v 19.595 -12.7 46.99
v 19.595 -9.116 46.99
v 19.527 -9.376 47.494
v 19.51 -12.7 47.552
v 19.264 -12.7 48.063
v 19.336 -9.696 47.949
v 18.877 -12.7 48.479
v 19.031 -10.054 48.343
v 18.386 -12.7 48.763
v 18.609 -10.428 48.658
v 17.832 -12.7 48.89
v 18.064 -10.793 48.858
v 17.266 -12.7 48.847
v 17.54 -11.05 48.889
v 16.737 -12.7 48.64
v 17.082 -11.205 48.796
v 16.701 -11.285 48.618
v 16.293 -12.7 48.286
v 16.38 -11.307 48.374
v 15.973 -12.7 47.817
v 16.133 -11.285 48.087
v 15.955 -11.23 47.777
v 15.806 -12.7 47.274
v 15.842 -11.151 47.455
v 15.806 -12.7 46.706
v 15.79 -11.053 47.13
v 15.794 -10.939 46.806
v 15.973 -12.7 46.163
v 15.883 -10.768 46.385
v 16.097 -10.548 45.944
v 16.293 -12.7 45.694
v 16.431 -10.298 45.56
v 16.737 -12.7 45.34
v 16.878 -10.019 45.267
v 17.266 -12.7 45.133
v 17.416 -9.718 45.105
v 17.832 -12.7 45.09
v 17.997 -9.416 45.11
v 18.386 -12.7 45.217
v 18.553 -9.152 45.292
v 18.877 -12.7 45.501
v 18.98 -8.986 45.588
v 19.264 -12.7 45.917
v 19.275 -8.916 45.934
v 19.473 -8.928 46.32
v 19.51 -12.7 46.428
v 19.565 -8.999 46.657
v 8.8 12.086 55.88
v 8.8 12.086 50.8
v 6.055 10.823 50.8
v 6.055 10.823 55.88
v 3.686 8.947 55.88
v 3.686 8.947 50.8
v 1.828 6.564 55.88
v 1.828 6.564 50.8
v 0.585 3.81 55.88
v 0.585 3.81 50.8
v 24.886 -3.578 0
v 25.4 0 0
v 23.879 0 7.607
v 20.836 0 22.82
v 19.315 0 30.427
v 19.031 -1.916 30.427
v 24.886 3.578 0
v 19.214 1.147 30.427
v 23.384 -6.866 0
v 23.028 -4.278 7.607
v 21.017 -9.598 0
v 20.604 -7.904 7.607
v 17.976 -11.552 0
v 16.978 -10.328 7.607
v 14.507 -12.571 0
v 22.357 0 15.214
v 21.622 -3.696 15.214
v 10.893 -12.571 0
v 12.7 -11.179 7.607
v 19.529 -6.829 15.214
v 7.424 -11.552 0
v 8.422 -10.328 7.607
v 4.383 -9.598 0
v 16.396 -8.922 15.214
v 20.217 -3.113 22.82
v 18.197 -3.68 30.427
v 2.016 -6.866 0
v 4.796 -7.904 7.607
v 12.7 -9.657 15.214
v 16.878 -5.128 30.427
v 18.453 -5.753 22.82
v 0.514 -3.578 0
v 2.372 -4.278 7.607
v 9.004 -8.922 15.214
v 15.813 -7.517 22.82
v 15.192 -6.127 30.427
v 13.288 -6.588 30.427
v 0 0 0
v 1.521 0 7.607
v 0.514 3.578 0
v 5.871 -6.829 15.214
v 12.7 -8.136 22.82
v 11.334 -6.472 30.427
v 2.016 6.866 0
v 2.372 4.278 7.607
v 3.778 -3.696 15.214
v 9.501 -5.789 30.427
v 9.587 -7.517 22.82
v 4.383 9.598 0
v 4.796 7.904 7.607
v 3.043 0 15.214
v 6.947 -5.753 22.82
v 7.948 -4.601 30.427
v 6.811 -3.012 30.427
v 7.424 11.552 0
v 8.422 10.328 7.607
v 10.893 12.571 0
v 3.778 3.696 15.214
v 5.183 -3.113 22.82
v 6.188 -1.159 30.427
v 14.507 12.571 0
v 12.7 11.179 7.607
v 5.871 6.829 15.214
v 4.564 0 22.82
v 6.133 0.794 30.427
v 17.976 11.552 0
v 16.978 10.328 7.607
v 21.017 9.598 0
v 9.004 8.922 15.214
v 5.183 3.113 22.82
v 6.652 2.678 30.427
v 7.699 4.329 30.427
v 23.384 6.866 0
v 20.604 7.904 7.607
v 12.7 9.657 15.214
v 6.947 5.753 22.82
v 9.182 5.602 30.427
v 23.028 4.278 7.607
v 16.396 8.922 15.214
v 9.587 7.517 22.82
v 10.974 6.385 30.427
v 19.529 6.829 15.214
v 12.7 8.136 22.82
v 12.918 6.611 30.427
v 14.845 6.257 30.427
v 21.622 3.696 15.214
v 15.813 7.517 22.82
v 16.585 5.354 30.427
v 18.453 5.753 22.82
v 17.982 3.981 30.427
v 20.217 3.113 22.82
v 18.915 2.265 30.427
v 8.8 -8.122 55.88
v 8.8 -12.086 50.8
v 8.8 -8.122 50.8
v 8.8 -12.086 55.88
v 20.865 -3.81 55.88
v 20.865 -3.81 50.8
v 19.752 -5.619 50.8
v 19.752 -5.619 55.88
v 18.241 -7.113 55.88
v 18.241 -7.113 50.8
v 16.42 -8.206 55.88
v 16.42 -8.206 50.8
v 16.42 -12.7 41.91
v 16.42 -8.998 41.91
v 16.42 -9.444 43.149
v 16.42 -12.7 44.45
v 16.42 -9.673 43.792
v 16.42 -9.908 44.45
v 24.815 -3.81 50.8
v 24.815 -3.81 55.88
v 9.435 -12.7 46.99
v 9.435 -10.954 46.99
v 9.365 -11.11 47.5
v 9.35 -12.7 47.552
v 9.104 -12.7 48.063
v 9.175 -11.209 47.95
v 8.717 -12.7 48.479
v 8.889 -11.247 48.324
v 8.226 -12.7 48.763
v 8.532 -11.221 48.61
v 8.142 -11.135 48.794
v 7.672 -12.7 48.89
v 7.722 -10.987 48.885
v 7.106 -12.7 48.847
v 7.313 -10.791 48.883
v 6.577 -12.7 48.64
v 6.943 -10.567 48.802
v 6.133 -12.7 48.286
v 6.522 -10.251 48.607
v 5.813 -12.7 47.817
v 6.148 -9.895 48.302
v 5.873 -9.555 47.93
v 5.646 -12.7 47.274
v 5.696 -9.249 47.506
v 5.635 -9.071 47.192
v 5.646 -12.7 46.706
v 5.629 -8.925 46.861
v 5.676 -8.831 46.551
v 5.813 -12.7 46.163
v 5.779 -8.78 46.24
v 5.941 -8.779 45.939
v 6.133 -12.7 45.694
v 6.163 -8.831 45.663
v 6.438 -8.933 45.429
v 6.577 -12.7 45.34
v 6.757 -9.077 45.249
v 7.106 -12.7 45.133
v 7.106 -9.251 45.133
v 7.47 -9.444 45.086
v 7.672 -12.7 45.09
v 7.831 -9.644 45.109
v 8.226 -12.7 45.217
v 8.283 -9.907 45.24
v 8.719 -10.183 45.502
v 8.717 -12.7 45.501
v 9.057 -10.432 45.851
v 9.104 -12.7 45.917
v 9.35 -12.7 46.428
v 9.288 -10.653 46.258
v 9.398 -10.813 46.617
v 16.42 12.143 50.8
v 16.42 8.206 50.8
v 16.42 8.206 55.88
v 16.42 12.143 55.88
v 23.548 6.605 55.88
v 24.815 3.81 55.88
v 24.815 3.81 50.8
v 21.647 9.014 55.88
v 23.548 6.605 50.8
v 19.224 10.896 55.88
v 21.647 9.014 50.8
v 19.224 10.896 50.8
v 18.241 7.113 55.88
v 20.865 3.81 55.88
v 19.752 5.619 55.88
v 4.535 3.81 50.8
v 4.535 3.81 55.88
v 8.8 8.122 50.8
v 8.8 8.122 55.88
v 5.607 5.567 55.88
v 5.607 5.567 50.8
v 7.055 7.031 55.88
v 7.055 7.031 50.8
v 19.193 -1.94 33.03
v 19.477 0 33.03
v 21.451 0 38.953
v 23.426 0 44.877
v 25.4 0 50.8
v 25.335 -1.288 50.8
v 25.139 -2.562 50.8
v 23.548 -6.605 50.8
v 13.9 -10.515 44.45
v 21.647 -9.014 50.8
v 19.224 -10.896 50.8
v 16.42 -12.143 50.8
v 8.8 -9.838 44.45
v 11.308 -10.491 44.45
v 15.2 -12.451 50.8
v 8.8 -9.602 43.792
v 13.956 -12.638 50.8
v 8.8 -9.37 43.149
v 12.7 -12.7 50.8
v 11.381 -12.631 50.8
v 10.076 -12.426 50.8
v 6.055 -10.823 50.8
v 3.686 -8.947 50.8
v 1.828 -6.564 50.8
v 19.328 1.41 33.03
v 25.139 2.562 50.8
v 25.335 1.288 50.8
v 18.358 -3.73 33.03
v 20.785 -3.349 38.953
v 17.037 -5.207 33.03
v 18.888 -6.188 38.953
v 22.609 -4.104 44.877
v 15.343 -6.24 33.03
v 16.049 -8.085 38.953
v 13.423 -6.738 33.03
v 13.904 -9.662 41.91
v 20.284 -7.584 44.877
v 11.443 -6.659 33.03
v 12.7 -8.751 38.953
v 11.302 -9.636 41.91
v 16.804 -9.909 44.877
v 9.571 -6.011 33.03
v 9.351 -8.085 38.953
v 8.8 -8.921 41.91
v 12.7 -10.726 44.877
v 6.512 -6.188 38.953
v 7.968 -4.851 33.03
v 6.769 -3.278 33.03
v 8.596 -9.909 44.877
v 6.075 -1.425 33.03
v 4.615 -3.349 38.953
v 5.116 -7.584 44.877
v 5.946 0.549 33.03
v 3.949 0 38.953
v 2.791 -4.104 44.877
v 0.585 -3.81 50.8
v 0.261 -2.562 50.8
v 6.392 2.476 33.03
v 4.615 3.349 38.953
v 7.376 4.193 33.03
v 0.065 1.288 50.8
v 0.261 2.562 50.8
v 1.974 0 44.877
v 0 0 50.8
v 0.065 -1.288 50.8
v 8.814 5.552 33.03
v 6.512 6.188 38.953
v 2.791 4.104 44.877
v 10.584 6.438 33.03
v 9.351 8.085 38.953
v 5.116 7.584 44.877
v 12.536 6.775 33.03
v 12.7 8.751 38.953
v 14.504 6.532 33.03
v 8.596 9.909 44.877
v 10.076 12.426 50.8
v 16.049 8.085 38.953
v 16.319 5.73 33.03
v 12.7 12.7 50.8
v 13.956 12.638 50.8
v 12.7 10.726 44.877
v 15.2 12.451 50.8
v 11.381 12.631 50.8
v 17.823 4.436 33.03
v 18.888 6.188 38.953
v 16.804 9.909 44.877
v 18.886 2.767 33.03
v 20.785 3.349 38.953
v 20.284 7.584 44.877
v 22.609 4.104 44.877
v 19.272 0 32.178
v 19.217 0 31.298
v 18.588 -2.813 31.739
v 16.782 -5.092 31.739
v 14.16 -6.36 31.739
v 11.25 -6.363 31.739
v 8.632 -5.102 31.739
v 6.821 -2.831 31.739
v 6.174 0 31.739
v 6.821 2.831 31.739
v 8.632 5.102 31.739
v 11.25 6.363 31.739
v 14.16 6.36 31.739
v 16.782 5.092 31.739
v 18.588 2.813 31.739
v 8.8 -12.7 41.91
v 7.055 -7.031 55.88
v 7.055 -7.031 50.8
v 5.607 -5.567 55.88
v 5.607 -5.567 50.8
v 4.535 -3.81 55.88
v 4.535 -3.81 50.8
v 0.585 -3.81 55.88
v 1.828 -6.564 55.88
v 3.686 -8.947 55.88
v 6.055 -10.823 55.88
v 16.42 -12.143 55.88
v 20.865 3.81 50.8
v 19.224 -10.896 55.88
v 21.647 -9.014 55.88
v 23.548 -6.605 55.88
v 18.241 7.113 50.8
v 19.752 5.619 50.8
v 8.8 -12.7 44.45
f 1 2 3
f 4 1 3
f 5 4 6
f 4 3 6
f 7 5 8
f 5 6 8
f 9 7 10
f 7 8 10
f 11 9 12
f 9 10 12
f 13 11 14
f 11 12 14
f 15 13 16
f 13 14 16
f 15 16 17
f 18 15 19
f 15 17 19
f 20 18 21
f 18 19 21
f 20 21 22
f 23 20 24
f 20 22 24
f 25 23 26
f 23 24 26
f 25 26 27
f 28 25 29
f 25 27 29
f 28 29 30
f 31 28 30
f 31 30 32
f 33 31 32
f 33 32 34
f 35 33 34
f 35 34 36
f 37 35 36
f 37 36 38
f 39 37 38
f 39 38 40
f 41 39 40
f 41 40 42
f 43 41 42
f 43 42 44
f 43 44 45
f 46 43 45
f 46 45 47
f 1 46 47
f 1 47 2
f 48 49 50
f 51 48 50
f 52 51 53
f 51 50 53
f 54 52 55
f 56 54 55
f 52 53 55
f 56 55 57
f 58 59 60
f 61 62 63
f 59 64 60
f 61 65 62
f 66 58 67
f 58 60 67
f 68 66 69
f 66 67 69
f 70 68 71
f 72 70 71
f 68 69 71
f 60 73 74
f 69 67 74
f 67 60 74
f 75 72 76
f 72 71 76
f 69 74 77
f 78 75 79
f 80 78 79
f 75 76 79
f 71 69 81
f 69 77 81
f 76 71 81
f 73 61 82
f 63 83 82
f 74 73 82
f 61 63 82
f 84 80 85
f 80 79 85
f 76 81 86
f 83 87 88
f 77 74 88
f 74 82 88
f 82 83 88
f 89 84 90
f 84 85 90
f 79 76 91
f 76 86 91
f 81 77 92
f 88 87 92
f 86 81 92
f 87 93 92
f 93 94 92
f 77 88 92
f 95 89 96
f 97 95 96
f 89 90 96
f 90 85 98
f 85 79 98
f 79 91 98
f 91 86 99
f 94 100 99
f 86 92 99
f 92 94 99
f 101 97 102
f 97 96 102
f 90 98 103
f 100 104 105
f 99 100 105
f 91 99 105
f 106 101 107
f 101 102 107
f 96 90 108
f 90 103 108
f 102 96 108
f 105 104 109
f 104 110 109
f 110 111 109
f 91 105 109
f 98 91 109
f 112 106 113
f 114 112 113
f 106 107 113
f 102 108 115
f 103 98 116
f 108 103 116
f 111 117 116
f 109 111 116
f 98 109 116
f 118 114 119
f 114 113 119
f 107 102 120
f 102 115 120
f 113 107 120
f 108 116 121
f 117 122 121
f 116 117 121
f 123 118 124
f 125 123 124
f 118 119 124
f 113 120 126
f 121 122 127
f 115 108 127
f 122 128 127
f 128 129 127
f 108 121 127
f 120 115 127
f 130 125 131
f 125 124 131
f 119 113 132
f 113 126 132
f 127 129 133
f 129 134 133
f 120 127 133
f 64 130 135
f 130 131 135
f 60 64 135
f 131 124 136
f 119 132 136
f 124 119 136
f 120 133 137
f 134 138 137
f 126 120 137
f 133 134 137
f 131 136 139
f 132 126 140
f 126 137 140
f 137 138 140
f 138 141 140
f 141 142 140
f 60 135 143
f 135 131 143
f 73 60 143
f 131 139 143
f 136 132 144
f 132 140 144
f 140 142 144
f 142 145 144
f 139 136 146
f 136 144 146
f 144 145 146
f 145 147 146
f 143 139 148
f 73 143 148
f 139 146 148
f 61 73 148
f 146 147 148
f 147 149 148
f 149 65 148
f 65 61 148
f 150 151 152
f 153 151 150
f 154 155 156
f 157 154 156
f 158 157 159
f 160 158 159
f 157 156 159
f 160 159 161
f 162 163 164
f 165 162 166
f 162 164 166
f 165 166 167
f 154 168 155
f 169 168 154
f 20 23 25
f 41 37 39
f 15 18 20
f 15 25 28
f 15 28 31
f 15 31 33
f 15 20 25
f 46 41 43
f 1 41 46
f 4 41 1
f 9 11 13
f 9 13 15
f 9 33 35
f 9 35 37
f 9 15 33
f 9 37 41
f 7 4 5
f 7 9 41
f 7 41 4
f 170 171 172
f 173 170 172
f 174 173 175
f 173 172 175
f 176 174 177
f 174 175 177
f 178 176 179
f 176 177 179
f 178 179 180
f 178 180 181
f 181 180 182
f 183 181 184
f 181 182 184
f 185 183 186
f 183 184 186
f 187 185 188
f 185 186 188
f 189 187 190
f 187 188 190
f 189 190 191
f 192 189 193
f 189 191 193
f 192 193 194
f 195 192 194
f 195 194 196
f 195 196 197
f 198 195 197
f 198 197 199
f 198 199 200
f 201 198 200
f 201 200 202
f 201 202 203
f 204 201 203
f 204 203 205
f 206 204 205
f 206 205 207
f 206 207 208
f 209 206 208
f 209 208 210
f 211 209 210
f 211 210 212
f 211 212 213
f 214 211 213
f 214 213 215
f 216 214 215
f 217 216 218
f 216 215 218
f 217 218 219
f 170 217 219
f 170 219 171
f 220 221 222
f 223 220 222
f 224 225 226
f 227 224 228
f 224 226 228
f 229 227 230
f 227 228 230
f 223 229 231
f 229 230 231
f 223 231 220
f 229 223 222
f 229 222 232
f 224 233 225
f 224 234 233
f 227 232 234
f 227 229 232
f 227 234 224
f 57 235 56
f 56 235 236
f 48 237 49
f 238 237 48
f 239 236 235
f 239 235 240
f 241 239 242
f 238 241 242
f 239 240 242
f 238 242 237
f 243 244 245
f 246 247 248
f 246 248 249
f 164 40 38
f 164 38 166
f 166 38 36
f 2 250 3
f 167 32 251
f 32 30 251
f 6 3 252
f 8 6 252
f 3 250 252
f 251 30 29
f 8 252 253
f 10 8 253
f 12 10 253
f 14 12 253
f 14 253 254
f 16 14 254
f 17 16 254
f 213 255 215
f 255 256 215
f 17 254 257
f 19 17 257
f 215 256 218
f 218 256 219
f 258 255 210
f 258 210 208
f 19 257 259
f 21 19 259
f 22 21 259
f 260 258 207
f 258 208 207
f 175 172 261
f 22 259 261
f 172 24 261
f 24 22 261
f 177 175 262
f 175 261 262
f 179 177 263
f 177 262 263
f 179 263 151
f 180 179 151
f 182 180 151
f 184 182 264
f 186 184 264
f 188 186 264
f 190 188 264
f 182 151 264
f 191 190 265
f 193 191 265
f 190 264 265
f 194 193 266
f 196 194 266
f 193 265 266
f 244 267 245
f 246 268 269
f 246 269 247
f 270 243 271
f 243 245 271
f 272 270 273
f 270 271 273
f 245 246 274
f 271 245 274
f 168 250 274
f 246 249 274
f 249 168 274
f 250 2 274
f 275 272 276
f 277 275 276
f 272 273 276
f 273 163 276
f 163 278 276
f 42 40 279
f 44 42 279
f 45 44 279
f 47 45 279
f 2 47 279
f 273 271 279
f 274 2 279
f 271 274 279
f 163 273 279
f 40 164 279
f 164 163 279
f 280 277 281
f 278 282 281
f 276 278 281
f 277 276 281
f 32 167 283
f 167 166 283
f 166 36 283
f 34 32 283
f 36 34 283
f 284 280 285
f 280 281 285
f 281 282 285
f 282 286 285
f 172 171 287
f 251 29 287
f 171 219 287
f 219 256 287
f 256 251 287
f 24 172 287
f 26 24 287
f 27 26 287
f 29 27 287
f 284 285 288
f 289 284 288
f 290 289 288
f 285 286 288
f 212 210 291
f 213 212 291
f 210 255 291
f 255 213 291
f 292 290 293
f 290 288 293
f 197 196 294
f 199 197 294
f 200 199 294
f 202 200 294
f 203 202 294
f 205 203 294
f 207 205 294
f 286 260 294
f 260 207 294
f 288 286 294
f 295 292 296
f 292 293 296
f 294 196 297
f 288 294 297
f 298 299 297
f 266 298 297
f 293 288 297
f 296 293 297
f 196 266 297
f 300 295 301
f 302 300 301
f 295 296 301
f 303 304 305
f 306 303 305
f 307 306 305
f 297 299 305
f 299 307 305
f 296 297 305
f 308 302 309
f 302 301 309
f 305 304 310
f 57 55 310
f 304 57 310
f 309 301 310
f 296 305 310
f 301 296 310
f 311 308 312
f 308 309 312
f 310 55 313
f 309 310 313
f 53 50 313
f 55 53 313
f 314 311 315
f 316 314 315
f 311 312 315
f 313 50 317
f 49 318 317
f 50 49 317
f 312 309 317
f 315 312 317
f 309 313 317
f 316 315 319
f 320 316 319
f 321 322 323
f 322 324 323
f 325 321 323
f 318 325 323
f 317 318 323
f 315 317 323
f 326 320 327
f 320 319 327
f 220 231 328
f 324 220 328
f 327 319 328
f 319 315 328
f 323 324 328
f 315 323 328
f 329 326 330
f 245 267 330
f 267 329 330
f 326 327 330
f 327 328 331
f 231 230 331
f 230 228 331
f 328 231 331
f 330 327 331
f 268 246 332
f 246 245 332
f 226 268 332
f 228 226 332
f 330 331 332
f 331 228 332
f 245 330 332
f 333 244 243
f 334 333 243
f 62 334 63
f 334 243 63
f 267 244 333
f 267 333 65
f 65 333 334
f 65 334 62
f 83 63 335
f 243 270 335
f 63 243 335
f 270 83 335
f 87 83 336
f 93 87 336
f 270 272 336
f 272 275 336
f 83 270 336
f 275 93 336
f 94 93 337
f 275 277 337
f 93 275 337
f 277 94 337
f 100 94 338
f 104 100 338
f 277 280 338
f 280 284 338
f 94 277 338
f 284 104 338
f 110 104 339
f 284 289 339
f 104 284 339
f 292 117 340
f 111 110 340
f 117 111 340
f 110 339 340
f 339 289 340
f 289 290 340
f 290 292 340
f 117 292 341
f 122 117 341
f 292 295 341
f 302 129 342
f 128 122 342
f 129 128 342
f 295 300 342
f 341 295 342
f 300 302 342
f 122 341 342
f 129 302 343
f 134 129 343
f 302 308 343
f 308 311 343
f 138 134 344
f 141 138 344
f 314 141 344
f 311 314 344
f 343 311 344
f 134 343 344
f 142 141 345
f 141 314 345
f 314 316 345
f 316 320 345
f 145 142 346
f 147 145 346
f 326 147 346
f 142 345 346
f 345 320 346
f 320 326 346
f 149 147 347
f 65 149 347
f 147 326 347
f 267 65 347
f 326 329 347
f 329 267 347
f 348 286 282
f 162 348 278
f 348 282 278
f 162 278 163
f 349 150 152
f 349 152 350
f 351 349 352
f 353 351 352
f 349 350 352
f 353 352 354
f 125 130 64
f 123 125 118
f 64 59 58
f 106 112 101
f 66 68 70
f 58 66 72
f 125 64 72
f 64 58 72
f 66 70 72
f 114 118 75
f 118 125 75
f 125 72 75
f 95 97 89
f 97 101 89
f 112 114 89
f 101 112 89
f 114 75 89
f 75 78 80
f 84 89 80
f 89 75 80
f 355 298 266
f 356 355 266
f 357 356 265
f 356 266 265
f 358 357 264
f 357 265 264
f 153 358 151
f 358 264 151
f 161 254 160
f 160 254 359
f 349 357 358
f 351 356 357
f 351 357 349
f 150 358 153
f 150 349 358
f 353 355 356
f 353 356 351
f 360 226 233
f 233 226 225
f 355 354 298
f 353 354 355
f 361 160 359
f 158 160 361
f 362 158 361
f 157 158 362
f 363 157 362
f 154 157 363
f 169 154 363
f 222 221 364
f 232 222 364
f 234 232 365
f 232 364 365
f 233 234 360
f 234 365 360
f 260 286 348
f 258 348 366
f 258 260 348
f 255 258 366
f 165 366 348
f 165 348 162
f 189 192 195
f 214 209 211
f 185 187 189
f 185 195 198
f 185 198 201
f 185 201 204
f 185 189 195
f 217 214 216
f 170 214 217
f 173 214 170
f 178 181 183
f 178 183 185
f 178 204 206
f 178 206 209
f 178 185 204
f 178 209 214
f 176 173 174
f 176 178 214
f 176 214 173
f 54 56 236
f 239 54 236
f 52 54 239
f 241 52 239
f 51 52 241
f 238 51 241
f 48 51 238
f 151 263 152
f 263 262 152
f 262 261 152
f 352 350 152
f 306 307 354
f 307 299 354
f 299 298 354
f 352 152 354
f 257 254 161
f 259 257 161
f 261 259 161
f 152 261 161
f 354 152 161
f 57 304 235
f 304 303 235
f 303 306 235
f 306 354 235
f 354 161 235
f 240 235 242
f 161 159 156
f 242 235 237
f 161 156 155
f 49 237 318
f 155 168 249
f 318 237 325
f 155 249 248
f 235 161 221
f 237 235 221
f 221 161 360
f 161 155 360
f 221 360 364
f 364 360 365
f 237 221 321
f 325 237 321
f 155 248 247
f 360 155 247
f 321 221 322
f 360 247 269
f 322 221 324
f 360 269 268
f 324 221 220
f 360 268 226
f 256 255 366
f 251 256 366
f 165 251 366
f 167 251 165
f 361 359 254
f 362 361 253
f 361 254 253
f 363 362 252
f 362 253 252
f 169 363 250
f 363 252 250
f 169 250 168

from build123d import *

# Parameters (mm, degrees)
F3_DEPTH  = 5.08
F5_W      = 7.62
F5_H      = 5.08
F6_DEPTH  = 38.101
F8_W      = 7.62
F8_H      = 5.08
F9_DEPTH  = 25.401
F10_R     = 1.905
F10_W     = 7.62
F10_H     = 2.54
F11_DEPTH = 12.7
F12_R     = 5.08


with BuildPart() as f1:
    # F0 (on Front) → F1 (revolve)
    with BuildSketch(Plane.XZ):
        Polygon((12.7, 50.8), (12.7, 0), (25.4, 0), (19.05, 31.75), (25.4, 50.8), align=None)
    revolve(axis=Axis((12.7, 0, 25.4), (0, 0, -1)))

    # F2 (on face) → F3 (join)
    with BuildSketch(Plane.XY.offset(50.8)):
        with BuildLine():
            ThreePointArc((0, 0), (3.7197438789, -8.9802561211), (12.7, -12.7))
            Line((12.7, -12.7), (12.7, -8.9802561211))
            Line((12.7, -8.9802561211), (12.6097438789, -8.9802561211))
            ThreePointArc((12.6097438789, -8.9802561211), (6.3235645942, -6.3764354058), (3.7197438789, -0.0902561211))
            Line((3.7197438789, -0.0902561211), (3.7197438789, 0.0902561211))
            ThreePointArc((3.7197438789, 0.0902561211), (6.3235645942, 6.3764354058), (12.6097438789, 8.9802561211))
            Line((12.6097438789, 8.9802561211), (12.7, 8.9802561211))
            Line((12.7, 8.9802561211), (12.7, 12.7))
            ThreePointArc((12.7, 12.7), (3.7197438789, 8.9802561211), (0, 0))
        make_face()
        with BuildLine():
            Line((12.7, -8.9802561211), (12.7, -12.7))
            ThreePointArc((12.7, -12.7), (21.6802561211, -8.9802561211), (25.4, 0))
            ThreePointArc((25.4, 0), (21.6802561211, 8.9802561211), (12.7, 12.7))
            Line((12.7, 12.7), (12.7, 8.9802561211))
            Line((12.7, 8.9802561211), (12.7902561211, 8.9802561211))
            ThreePointArc((12.7902561211, 8.9802561211), (19.0764354058, 6.3764354058), (21.6802561211, 0.0902561211))
            Line((21.6802561211, 0.0902561211), (21.6802561211, -0.0902561211))
            ThreePointArc((21.6802561211, -0.0902561211), (19.0764354058, -6.3764354058), (12.7902561211, -8.9802561211))
            Line((12.7902561211, -8.9802561211), (12.7, -8.9802561211))
        make_face()
    extrude(amount=F3_DEPTH)

    # F5 (on offset) → F6 (cut, through all)
    with BuildSketch(Plane.XZ.offset(25.4)):
        with Locations((12.6097438789, 53.34)):
            Rectangle(F5_W, F5_H)
    extrude(amount=-F6_DEPTH, mode=Mode.SUBTRACT)

    # F8 (on offset) → F9 (cut, through all)
    with BuildSketch(Plane.YZ.offset(25.4)):
        with Locations((0, 53.34)):
            Rectangle(F8_W, F8_H)
    extrude(amount=-F9_DEPTH, mode=Mode.SUBTRACT)

    # F10 (on Front) → F11 (join)
    with BuildSketch(Plane.XZ):
        with Locations((7.5297438789, 46.99)):
            Circle(F10_R)
        with Locations((17.6897438789, 46.99)):
            Circle(F10_R)
        with Locations((12.6097438789, 43.18)):
            Rectangle(F10_W, F10_H)
    extrude(amount=F11_DEPTH)

    # F12
    f12_edges = [f1.edges().sort_by_distance(p)[0] for p in [
        (6.35, 0, 31.75),
    ]]
    fillet(f12_edges, radius=F12_R)


solid = f1.part
